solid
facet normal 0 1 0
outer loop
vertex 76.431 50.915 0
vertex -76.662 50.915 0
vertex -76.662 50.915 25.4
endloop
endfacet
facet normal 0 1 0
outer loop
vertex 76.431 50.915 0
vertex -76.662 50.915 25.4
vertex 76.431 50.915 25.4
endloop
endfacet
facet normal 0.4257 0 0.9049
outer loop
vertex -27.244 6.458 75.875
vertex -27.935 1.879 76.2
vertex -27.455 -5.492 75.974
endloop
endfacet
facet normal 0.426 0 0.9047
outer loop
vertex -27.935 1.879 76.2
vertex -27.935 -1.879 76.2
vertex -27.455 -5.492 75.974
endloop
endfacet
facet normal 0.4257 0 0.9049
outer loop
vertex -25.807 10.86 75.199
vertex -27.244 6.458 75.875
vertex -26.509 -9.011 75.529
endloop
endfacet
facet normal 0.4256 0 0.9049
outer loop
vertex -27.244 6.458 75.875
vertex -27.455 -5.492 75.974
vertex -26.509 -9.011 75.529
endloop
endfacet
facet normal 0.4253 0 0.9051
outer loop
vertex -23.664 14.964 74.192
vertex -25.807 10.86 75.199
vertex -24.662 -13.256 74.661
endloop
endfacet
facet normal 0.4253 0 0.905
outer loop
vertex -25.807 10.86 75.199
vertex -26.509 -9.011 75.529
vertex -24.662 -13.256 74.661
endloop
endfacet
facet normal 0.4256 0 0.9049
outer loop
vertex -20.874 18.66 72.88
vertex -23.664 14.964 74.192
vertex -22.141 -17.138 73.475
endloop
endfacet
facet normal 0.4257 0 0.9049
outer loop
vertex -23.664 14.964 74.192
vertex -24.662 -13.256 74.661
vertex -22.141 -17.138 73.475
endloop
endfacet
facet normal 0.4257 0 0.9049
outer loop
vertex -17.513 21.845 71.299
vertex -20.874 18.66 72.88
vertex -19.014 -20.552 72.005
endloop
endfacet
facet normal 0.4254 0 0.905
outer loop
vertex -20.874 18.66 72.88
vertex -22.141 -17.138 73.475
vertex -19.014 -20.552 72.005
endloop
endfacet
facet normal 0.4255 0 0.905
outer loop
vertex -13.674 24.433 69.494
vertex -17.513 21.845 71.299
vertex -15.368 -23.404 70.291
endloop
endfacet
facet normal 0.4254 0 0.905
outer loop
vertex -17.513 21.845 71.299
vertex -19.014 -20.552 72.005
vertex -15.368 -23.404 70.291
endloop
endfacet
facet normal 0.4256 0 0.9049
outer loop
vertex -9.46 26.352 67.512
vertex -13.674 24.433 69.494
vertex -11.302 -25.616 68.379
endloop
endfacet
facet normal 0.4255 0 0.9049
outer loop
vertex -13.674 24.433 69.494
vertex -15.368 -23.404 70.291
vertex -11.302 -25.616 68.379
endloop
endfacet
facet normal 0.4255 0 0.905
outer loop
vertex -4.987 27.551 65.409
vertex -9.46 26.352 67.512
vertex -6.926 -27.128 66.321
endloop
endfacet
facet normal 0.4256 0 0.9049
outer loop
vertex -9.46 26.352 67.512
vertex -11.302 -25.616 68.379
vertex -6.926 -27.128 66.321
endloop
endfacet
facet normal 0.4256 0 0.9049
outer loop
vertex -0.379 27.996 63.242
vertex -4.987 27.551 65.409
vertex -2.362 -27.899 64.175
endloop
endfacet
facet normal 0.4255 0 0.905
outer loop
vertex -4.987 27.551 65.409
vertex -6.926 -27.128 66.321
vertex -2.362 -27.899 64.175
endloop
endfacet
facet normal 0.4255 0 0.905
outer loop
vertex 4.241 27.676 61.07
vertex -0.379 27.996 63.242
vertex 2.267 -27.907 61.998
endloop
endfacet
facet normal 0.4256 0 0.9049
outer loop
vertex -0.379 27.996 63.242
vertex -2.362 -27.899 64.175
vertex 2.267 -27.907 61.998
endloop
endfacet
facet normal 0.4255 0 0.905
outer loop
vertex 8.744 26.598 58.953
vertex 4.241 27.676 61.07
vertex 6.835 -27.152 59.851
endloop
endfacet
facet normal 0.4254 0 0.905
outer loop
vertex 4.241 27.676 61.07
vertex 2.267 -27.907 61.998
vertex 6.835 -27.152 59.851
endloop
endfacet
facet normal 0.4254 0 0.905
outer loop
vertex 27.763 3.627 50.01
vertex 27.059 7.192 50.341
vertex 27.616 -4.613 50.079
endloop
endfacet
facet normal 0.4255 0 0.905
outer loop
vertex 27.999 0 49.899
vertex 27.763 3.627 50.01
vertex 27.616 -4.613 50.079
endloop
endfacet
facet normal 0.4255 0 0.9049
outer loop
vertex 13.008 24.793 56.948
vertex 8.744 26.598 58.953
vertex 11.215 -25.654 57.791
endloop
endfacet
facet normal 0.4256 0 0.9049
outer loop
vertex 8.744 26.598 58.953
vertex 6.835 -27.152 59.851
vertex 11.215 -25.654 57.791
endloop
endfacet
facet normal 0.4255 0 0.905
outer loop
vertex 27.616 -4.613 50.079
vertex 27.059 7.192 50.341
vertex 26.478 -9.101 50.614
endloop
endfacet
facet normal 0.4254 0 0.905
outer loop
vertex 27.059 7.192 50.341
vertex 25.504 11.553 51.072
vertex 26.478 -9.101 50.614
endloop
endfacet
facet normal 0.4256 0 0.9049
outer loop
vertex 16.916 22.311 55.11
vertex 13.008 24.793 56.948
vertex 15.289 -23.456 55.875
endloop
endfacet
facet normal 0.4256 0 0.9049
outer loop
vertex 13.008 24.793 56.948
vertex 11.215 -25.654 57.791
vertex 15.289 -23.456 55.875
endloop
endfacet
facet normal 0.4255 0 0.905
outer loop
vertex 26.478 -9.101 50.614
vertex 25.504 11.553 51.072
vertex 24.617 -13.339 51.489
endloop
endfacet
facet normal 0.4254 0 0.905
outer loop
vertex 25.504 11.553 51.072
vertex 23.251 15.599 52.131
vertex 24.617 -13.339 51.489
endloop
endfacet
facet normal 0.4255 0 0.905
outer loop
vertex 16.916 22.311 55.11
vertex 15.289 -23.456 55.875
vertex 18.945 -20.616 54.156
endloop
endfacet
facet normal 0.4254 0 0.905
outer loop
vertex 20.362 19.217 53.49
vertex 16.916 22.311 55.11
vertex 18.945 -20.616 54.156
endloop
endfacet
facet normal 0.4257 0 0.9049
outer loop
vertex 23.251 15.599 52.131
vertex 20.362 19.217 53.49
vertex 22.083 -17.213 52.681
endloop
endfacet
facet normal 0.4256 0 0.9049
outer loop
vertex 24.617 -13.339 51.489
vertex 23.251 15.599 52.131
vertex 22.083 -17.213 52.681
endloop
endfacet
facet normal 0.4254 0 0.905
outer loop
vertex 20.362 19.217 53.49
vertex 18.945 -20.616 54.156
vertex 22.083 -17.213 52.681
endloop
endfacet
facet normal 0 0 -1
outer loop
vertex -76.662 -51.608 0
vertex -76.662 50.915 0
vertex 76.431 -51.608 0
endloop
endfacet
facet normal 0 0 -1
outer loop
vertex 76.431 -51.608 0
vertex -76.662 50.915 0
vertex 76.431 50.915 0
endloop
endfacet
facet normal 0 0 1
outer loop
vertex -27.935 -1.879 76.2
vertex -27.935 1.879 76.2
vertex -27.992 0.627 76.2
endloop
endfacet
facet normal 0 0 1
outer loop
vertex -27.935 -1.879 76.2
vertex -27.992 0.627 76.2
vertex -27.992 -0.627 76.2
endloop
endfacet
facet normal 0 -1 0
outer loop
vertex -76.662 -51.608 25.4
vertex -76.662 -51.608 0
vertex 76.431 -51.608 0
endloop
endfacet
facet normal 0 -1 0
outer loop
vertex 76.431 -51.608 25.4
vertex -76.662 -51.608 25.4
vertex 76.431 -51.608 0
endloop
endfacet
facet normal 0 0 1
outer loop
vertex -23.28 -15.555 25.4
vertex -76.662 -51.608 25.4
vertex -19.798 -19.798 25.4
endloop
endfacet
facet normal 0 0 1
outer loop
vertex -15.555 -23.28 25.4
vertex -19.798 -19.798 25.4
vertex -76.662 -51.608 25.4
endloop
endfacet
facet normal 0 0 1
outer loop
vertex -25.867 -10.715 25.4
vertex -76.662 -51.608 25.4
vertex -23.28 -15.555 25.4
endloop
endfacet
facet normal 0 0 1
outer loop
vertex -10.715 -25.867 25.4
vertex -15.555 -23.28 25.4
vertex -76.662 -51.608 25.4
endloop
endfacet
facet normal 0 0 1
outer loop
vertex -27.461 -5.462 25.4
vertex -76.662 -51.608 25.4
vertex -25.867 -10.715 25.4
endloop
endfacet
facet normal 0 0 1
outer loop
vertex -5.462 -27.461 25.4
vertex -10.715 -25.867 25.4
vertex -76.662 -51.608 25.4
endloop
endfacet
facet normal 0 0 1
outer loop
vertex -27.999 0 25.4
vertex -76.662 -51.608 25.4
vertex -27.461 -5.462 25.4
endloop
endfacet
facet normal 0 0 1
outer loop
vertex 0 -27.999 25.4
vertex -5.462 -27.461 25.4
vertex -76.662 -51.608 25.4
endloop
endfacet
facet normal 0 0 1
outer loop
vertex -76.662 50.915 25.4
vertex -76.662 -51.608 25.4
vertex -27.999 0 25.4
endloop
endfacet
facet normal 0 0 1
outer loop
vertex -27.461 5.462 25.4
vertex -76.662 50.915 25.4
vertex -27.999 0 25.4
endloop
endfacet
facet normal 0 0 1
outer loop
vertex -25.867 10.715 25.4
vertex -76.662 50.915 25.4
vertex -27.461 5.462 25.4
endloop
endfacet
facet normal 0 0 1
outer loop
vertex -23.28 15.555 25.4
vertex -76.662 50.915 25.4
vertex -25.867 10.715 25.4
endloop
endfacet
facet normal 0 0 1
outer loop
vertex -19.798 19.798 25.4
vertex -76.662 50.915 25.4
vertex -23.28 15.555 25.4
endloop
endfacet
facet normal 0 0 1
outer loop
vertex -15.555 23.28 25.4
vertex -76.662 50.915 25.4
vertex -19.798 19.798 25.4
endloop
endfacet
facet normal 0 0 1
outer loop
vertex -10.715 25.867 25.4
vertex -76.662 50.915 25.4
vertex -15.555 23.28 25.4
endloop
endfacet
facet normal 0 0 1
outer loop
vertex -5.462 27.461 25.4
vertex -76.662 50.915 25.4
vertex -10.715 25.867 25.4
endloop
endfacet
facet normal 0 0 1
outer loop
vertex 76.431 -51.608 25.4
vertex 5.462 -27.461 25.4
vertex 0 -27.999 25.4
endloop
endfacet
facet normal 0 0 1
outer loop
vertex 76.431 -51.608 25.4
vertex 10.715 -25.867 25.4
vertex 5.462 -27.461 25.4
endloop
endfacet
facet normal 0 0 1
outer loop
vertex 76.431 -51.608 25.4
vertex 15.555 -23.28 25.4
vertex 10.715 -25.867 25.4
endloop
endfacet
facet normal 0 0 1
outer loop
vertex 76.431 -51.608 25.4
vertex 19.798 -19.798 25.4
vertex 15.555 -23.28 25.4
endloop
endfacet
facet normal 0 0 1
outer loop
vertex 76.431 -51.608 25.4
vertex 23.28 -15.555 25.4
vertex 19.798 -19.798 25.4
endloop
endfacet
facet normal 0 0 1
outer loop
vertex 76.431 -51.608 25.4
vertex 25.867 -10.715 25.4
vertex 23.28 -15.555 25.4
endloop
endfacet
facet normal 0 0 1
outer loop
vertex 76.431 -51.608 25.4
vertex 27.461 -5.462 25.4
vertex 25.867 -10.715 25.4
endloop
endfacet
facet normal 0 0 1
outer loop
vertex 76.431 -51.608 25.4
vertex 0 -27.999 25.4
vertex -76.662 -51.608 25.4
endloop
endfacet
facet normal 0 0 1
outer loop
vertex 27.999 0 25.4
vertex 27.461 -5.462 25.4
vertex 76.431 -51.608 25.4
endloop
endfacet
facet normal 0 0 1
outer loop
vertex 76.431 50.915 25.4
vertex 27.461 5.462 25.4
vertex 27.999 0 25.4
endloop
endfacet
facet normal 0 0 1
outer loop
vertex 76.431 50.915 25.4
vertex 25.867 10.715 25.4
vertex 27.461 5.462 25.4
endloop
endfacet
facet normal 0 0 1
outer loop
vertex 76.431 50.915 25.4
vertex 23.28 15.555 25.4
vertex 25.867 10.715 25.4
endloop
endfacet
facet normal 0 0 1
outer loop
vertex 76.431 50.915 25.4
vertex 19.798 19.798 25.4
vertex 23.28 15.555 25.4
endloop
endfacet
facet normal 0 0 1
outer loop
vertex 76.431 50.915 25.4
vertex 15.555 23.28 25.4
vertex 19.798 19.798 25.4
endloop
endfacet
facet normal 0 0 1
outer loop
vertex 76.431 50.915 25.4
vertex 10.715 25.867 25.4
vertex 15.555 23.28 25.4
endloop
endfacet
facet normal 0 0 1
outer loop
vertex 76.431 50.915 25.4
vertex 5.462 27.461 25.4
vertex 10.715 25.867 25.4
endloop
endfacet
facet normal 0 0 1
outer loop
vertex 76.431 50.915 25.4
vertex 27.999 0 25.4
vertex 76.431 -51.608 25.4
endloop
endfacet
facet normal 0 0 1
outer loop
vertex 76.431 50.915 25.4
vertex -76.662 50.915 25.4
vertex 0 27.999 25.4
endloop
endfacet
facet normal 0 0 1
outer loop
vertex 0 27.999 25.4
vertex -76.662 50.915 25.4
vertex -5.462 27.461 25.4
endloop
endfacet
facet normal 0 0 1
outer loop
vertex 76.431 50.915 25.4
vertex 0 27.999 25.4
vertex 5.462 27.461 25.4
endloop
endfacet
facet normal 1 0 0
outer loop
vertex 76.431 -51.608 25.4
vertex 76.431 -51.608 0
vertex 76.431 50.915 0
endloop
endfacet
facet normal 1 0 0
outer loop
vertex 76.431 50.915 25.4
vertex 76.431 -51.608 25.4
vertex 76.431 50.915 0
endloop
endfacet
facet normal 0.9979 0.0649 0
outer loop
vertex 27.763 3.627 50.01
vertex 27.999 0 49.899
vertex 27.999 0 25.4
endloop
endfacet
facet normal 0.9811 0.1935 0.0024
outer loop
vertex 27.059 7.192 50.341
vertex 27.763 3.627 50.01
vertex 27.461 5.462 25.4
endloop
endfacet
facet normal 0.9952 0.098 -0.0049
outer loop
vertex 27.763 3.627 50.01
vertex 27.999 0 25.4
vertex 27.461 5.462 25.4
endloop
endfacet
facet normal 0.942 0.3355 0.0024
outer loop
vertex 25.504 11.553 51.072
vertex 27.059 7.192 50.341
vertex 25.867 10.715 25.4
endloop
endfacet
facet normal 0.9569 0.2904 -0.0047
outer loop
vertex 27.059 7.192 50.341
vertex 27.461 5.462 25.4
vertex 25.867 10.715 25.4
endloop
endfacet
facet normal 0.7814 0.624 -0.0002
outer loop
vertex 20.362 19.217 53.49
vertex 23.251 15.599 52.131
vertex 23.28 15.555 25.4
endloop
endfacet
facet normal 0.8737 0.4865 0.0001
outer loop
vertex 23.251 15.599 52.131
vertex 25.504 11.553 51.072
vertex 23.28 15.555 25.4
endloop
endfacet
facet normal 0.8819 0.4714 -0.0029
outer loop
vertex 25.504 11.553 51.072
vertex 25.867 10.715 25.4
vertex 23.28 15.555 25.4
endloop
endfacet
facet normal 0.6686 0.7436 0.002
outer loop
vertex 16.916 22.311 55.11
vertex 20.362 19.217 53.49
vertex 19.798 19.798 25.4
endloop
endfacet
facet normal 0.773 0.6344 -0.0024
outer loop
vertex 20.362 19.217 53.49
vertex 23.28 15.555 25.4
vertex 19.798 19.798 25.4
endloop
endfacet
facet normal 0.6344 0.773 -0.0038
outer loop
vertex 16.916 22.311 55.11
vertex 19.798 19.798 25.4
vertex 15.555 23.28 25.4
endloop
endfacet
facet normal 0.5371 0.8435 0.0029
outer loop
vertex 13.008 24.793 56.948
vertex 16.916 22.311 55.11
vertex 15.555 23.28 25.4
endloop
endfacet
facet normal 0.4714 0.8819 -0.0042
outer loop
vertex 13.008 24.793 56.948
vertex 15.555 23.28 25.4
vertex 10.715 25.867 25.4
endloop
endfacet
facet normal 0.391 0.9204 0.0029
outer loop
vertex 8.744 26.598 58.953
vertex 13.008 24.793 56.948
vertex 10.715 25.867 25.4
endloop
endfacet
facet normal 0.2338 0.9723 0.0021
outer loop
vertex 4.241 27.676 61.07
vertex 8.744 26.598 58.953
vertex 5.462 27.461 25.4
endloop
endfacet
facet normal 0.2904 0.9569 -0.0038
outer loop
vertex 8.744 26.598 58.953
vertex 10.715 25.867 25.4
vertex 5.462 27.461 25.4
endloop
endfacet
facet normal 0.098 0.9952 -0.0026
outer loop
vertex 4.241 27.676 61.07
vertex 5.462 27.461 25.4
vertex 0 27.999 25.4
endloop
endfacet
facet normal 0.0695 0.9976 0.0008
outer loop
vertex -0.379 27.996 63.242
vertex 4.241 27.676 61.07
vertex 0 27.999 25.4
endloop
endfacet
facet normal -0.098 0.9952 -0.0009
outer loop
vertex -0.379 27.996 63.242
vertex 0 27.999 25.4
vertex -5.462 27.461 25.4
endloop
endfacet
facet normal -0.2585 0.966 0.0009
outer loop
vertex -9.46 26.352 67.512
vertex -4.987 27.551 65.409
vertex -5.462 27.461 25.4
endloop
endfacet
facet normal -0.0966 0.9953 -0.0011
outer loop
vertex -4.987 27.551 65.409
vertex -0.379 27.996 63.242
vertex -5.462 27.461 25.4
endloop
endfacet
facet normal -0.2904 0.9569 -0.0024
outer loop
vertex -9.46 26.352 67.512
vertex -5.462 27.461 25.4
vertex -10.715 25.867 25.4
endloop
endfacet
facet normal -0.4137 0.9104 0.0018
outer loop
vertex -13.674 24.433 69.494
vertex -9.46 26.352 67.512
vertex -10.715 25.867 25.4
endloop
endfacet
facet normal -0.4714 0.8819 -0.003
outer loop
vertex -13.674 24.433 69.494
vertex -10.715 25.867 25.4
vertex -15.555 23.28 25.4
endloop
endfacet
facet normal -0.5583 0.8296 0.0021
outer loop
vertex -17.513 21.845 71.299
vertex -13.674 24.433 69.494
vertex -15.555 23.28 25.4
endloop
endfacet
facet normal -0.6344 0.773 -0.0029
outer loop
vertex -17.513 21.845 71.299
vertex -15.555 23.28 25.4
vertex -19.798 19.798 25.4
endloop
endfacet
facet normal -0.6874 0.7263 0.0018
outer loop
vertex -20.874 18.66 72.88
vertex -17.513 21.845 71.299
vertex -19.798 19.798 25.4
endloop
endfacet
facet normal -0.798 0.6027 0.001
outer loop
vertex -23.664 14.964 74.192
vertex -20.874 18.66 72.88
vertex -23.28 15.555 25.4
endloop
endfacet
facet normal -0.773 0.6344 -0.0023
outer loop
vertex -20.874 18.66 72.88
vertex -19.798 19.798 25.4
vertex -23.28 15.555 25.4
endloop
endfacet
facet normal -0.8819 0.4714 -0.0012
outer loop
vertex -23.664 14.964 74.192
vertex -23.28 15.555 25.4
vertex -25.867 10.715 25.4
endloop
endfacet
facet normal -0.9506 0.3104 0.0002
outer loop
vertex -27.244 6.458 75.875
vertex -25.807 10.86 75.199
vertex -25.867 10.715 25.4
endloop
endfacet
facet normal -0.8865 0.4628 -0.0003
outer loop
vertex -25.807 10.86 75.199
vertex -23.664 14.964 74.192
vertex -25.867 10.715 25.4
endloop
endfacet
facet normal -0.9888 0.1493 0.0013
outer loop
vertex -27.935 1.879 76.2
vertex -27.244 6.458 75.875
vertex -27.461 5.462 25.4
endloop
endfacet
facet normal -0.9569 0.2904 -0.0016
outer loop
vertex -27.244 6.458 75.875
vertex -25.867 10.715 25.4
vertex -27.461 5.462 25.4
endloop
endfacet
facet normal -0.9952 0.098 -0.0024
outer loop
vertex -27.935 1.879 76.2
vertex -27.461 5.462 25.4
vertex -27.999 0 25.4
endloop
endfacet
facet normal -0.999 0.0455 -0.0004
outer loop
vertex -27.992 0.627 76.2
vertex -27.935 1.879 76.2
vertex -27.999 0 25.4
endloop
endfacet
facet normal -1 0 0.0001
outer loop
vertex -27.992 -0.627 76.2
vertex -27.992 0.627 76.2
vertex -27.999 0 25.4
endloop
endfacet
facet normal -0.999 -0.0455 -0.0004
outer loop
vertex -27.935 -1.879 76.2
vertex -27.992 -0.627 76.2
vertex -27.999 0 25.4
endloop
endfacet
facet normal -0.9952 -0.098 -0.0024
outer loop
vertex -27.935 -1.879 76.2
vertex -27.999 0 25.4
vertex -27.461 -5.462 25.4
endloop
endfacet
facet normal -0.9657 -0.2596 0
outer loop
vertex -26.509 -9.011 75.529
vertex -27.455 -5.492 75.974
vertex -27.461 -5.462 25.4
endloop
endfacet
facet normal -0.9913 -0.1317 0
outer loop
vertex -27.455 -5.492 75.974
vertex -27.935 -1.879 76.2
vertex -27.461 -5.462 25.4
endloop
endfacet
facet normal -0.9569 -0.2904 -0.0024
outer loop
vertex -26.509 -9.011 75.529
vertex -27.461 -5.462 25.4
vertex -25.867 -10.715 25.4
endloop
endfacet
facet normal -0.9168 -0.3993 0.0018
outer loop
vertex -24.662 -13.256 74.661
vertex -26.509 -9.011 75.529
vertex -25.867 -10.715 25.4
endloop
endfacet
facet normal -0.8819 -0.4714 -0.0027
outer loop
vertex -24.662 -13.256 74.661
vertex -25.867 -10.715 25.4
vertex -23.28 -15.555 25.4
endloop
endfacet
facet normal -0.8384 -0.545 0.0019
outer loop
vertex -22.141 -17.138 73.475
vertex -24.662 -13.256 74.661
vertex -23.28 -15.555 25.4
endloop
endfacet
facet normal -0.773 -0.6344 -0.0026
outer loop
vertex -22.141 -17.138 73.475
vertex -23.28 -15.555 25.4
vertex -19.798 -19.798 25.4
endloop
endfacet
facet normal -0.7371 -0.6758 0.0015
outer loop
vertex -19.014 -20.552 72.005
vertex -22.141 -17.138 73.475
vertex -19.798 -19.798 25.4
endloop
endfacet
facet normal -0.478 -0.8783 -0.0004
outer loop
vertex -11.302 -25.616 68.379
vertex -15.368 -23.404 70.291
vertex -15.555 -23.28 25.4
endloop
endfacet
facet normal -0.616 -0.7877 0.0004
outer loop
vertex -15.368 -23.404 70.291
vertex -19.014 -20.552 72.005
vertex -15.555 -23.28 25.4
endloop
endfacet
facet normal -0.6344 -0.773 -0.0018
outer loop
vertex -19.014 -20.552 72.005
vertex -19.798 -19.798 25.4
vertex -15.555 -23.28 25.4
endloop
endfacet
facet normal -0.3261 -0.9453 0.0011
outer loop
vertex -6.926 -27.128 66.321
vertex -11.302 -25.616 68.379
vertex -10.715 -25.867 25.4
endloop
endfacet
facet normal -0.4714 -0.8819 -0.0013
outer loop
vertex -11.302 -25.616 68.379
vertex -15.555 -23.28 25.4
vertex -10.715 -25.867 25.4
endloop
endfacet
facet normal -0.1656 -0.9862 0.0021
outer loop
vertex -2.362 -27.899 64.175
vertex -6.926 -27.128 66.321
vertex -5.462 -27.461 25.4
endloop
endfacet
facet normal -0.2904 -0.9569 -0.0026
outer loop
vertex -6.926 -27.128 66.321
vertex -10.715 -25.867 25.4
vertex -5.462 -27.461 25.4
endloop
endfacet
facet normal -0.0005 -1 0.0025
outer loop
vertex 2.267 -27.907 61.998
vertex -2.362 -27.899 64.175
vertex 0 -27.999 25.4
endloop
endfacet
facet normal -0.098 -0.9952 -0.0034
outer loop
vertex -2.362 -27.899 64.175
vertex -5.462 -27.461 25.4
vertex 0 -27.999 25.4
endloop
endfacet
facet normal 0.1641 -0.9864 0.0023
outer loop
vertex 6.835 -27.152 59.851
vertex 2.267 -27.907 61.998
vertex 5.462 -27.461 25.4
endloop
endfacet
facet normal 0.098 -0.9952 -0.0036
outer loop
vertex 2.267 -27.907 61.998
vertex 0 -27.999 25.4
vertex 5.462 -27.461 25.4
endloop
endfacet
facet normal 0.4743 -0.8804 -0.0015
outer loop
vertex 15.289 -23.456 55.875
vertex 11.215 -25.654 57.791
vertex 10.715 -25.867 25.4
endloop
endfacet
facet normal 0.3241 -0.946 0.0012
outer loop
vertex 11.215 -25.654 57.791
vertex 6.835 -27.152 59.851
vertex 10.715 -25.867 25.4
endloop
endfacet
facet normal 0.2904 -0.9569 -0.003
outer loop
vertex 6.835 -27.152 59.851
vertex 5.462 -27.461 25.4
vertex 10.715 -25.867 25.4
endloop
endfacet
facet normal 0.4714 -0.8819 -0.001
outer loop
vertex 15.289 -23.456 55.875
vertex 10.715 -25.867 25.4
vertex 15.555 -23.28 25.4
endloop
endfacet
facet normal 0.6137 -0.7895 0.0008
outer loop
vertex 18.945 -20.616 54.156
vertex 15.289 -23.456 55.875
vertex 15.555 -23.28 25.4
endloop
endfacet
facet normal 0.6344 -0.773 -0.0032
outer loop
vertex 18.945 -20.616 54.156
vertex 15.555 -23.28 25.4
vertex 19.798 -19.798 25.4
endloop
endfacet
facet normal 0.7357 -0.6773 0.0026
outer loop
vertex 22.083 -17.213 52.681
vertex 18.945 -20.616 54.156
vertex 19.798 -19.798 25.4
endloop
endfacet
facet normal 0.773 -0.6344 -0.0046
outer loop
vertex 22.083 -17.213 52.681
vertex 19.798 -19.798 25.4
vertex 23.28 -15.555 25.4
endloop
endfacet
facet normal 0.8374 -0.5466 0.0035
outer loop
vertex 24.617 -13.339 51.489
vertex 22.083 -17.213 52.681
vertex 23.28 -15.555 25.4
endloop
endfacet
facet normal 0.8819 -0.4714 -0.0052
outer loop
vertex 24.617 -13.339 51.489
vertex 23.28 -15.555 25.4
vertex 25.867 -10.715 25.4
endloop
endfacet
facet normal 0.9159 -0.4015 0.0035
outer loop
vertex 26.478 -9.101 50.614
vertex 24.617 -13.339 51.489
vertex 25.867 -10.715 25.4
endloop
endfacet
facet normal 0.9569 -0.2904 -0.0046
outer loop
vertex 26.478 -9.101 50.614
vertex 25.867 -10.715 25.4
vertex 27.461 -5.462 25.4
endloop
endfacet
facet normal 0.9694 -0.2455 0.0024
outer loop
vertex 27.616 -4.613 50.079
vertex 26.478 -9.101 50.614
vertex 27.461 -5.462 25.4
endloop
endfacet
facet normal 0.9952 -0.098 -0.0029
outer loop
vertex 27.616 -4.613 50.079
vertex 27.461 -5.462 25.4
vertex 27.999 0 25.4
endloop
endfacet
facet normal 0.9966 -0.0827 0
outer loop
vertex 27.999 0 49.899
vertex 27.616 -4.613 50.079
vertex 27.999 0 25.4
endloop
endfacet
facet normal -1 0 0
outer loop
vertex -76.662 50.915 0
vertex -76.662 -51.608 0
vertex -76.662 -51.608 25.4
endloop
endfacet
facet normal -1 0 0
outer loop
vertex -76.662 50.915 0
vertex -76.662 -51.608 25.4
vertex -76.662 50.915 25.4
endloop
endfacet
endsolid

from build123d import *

# Parameters (mm, degrees)
F0_W     = 153.0927270651
F0_H     = 102.5236323476
F1_DEPTH = 25.4
F2_R     = 27.9986216142
F3_DEPTH = 50.8
F5_DEPTH = 121.412


# Not quite as in the source:
# - a feature names something its author has since deleted; it is built from what else it names


with BuildPart() as f1:
    # F0 (on Top) → F1 (new body)
    with BuildSketch(Plane.XY):
        with Locations((-0.1154541969, -0.3463625908)):
            Rectangle(F0_W, F0_H)
    extrude(amount=F1_DEPTH)

    # F2 (on face) → F3 (join)
    with BuildSketch(Plane.XY.offset(25.4)):
        Circle(F2_R)
    extrude(amount=F3_DEPTH)

    # F4 (on face) → F5 (cut)
    with BuildSketch(Plane.XZ.offset(51.6081787646)):
        Polygon((29.090275988, 49.3855252862), (29.2704553796, 77.5817409158), (-30.8739859611, 77.5817409158), align=None)
    extrude(amount=-F5_DEPTH, mode=Mode.SUBTRACT)


solid = f1.part
